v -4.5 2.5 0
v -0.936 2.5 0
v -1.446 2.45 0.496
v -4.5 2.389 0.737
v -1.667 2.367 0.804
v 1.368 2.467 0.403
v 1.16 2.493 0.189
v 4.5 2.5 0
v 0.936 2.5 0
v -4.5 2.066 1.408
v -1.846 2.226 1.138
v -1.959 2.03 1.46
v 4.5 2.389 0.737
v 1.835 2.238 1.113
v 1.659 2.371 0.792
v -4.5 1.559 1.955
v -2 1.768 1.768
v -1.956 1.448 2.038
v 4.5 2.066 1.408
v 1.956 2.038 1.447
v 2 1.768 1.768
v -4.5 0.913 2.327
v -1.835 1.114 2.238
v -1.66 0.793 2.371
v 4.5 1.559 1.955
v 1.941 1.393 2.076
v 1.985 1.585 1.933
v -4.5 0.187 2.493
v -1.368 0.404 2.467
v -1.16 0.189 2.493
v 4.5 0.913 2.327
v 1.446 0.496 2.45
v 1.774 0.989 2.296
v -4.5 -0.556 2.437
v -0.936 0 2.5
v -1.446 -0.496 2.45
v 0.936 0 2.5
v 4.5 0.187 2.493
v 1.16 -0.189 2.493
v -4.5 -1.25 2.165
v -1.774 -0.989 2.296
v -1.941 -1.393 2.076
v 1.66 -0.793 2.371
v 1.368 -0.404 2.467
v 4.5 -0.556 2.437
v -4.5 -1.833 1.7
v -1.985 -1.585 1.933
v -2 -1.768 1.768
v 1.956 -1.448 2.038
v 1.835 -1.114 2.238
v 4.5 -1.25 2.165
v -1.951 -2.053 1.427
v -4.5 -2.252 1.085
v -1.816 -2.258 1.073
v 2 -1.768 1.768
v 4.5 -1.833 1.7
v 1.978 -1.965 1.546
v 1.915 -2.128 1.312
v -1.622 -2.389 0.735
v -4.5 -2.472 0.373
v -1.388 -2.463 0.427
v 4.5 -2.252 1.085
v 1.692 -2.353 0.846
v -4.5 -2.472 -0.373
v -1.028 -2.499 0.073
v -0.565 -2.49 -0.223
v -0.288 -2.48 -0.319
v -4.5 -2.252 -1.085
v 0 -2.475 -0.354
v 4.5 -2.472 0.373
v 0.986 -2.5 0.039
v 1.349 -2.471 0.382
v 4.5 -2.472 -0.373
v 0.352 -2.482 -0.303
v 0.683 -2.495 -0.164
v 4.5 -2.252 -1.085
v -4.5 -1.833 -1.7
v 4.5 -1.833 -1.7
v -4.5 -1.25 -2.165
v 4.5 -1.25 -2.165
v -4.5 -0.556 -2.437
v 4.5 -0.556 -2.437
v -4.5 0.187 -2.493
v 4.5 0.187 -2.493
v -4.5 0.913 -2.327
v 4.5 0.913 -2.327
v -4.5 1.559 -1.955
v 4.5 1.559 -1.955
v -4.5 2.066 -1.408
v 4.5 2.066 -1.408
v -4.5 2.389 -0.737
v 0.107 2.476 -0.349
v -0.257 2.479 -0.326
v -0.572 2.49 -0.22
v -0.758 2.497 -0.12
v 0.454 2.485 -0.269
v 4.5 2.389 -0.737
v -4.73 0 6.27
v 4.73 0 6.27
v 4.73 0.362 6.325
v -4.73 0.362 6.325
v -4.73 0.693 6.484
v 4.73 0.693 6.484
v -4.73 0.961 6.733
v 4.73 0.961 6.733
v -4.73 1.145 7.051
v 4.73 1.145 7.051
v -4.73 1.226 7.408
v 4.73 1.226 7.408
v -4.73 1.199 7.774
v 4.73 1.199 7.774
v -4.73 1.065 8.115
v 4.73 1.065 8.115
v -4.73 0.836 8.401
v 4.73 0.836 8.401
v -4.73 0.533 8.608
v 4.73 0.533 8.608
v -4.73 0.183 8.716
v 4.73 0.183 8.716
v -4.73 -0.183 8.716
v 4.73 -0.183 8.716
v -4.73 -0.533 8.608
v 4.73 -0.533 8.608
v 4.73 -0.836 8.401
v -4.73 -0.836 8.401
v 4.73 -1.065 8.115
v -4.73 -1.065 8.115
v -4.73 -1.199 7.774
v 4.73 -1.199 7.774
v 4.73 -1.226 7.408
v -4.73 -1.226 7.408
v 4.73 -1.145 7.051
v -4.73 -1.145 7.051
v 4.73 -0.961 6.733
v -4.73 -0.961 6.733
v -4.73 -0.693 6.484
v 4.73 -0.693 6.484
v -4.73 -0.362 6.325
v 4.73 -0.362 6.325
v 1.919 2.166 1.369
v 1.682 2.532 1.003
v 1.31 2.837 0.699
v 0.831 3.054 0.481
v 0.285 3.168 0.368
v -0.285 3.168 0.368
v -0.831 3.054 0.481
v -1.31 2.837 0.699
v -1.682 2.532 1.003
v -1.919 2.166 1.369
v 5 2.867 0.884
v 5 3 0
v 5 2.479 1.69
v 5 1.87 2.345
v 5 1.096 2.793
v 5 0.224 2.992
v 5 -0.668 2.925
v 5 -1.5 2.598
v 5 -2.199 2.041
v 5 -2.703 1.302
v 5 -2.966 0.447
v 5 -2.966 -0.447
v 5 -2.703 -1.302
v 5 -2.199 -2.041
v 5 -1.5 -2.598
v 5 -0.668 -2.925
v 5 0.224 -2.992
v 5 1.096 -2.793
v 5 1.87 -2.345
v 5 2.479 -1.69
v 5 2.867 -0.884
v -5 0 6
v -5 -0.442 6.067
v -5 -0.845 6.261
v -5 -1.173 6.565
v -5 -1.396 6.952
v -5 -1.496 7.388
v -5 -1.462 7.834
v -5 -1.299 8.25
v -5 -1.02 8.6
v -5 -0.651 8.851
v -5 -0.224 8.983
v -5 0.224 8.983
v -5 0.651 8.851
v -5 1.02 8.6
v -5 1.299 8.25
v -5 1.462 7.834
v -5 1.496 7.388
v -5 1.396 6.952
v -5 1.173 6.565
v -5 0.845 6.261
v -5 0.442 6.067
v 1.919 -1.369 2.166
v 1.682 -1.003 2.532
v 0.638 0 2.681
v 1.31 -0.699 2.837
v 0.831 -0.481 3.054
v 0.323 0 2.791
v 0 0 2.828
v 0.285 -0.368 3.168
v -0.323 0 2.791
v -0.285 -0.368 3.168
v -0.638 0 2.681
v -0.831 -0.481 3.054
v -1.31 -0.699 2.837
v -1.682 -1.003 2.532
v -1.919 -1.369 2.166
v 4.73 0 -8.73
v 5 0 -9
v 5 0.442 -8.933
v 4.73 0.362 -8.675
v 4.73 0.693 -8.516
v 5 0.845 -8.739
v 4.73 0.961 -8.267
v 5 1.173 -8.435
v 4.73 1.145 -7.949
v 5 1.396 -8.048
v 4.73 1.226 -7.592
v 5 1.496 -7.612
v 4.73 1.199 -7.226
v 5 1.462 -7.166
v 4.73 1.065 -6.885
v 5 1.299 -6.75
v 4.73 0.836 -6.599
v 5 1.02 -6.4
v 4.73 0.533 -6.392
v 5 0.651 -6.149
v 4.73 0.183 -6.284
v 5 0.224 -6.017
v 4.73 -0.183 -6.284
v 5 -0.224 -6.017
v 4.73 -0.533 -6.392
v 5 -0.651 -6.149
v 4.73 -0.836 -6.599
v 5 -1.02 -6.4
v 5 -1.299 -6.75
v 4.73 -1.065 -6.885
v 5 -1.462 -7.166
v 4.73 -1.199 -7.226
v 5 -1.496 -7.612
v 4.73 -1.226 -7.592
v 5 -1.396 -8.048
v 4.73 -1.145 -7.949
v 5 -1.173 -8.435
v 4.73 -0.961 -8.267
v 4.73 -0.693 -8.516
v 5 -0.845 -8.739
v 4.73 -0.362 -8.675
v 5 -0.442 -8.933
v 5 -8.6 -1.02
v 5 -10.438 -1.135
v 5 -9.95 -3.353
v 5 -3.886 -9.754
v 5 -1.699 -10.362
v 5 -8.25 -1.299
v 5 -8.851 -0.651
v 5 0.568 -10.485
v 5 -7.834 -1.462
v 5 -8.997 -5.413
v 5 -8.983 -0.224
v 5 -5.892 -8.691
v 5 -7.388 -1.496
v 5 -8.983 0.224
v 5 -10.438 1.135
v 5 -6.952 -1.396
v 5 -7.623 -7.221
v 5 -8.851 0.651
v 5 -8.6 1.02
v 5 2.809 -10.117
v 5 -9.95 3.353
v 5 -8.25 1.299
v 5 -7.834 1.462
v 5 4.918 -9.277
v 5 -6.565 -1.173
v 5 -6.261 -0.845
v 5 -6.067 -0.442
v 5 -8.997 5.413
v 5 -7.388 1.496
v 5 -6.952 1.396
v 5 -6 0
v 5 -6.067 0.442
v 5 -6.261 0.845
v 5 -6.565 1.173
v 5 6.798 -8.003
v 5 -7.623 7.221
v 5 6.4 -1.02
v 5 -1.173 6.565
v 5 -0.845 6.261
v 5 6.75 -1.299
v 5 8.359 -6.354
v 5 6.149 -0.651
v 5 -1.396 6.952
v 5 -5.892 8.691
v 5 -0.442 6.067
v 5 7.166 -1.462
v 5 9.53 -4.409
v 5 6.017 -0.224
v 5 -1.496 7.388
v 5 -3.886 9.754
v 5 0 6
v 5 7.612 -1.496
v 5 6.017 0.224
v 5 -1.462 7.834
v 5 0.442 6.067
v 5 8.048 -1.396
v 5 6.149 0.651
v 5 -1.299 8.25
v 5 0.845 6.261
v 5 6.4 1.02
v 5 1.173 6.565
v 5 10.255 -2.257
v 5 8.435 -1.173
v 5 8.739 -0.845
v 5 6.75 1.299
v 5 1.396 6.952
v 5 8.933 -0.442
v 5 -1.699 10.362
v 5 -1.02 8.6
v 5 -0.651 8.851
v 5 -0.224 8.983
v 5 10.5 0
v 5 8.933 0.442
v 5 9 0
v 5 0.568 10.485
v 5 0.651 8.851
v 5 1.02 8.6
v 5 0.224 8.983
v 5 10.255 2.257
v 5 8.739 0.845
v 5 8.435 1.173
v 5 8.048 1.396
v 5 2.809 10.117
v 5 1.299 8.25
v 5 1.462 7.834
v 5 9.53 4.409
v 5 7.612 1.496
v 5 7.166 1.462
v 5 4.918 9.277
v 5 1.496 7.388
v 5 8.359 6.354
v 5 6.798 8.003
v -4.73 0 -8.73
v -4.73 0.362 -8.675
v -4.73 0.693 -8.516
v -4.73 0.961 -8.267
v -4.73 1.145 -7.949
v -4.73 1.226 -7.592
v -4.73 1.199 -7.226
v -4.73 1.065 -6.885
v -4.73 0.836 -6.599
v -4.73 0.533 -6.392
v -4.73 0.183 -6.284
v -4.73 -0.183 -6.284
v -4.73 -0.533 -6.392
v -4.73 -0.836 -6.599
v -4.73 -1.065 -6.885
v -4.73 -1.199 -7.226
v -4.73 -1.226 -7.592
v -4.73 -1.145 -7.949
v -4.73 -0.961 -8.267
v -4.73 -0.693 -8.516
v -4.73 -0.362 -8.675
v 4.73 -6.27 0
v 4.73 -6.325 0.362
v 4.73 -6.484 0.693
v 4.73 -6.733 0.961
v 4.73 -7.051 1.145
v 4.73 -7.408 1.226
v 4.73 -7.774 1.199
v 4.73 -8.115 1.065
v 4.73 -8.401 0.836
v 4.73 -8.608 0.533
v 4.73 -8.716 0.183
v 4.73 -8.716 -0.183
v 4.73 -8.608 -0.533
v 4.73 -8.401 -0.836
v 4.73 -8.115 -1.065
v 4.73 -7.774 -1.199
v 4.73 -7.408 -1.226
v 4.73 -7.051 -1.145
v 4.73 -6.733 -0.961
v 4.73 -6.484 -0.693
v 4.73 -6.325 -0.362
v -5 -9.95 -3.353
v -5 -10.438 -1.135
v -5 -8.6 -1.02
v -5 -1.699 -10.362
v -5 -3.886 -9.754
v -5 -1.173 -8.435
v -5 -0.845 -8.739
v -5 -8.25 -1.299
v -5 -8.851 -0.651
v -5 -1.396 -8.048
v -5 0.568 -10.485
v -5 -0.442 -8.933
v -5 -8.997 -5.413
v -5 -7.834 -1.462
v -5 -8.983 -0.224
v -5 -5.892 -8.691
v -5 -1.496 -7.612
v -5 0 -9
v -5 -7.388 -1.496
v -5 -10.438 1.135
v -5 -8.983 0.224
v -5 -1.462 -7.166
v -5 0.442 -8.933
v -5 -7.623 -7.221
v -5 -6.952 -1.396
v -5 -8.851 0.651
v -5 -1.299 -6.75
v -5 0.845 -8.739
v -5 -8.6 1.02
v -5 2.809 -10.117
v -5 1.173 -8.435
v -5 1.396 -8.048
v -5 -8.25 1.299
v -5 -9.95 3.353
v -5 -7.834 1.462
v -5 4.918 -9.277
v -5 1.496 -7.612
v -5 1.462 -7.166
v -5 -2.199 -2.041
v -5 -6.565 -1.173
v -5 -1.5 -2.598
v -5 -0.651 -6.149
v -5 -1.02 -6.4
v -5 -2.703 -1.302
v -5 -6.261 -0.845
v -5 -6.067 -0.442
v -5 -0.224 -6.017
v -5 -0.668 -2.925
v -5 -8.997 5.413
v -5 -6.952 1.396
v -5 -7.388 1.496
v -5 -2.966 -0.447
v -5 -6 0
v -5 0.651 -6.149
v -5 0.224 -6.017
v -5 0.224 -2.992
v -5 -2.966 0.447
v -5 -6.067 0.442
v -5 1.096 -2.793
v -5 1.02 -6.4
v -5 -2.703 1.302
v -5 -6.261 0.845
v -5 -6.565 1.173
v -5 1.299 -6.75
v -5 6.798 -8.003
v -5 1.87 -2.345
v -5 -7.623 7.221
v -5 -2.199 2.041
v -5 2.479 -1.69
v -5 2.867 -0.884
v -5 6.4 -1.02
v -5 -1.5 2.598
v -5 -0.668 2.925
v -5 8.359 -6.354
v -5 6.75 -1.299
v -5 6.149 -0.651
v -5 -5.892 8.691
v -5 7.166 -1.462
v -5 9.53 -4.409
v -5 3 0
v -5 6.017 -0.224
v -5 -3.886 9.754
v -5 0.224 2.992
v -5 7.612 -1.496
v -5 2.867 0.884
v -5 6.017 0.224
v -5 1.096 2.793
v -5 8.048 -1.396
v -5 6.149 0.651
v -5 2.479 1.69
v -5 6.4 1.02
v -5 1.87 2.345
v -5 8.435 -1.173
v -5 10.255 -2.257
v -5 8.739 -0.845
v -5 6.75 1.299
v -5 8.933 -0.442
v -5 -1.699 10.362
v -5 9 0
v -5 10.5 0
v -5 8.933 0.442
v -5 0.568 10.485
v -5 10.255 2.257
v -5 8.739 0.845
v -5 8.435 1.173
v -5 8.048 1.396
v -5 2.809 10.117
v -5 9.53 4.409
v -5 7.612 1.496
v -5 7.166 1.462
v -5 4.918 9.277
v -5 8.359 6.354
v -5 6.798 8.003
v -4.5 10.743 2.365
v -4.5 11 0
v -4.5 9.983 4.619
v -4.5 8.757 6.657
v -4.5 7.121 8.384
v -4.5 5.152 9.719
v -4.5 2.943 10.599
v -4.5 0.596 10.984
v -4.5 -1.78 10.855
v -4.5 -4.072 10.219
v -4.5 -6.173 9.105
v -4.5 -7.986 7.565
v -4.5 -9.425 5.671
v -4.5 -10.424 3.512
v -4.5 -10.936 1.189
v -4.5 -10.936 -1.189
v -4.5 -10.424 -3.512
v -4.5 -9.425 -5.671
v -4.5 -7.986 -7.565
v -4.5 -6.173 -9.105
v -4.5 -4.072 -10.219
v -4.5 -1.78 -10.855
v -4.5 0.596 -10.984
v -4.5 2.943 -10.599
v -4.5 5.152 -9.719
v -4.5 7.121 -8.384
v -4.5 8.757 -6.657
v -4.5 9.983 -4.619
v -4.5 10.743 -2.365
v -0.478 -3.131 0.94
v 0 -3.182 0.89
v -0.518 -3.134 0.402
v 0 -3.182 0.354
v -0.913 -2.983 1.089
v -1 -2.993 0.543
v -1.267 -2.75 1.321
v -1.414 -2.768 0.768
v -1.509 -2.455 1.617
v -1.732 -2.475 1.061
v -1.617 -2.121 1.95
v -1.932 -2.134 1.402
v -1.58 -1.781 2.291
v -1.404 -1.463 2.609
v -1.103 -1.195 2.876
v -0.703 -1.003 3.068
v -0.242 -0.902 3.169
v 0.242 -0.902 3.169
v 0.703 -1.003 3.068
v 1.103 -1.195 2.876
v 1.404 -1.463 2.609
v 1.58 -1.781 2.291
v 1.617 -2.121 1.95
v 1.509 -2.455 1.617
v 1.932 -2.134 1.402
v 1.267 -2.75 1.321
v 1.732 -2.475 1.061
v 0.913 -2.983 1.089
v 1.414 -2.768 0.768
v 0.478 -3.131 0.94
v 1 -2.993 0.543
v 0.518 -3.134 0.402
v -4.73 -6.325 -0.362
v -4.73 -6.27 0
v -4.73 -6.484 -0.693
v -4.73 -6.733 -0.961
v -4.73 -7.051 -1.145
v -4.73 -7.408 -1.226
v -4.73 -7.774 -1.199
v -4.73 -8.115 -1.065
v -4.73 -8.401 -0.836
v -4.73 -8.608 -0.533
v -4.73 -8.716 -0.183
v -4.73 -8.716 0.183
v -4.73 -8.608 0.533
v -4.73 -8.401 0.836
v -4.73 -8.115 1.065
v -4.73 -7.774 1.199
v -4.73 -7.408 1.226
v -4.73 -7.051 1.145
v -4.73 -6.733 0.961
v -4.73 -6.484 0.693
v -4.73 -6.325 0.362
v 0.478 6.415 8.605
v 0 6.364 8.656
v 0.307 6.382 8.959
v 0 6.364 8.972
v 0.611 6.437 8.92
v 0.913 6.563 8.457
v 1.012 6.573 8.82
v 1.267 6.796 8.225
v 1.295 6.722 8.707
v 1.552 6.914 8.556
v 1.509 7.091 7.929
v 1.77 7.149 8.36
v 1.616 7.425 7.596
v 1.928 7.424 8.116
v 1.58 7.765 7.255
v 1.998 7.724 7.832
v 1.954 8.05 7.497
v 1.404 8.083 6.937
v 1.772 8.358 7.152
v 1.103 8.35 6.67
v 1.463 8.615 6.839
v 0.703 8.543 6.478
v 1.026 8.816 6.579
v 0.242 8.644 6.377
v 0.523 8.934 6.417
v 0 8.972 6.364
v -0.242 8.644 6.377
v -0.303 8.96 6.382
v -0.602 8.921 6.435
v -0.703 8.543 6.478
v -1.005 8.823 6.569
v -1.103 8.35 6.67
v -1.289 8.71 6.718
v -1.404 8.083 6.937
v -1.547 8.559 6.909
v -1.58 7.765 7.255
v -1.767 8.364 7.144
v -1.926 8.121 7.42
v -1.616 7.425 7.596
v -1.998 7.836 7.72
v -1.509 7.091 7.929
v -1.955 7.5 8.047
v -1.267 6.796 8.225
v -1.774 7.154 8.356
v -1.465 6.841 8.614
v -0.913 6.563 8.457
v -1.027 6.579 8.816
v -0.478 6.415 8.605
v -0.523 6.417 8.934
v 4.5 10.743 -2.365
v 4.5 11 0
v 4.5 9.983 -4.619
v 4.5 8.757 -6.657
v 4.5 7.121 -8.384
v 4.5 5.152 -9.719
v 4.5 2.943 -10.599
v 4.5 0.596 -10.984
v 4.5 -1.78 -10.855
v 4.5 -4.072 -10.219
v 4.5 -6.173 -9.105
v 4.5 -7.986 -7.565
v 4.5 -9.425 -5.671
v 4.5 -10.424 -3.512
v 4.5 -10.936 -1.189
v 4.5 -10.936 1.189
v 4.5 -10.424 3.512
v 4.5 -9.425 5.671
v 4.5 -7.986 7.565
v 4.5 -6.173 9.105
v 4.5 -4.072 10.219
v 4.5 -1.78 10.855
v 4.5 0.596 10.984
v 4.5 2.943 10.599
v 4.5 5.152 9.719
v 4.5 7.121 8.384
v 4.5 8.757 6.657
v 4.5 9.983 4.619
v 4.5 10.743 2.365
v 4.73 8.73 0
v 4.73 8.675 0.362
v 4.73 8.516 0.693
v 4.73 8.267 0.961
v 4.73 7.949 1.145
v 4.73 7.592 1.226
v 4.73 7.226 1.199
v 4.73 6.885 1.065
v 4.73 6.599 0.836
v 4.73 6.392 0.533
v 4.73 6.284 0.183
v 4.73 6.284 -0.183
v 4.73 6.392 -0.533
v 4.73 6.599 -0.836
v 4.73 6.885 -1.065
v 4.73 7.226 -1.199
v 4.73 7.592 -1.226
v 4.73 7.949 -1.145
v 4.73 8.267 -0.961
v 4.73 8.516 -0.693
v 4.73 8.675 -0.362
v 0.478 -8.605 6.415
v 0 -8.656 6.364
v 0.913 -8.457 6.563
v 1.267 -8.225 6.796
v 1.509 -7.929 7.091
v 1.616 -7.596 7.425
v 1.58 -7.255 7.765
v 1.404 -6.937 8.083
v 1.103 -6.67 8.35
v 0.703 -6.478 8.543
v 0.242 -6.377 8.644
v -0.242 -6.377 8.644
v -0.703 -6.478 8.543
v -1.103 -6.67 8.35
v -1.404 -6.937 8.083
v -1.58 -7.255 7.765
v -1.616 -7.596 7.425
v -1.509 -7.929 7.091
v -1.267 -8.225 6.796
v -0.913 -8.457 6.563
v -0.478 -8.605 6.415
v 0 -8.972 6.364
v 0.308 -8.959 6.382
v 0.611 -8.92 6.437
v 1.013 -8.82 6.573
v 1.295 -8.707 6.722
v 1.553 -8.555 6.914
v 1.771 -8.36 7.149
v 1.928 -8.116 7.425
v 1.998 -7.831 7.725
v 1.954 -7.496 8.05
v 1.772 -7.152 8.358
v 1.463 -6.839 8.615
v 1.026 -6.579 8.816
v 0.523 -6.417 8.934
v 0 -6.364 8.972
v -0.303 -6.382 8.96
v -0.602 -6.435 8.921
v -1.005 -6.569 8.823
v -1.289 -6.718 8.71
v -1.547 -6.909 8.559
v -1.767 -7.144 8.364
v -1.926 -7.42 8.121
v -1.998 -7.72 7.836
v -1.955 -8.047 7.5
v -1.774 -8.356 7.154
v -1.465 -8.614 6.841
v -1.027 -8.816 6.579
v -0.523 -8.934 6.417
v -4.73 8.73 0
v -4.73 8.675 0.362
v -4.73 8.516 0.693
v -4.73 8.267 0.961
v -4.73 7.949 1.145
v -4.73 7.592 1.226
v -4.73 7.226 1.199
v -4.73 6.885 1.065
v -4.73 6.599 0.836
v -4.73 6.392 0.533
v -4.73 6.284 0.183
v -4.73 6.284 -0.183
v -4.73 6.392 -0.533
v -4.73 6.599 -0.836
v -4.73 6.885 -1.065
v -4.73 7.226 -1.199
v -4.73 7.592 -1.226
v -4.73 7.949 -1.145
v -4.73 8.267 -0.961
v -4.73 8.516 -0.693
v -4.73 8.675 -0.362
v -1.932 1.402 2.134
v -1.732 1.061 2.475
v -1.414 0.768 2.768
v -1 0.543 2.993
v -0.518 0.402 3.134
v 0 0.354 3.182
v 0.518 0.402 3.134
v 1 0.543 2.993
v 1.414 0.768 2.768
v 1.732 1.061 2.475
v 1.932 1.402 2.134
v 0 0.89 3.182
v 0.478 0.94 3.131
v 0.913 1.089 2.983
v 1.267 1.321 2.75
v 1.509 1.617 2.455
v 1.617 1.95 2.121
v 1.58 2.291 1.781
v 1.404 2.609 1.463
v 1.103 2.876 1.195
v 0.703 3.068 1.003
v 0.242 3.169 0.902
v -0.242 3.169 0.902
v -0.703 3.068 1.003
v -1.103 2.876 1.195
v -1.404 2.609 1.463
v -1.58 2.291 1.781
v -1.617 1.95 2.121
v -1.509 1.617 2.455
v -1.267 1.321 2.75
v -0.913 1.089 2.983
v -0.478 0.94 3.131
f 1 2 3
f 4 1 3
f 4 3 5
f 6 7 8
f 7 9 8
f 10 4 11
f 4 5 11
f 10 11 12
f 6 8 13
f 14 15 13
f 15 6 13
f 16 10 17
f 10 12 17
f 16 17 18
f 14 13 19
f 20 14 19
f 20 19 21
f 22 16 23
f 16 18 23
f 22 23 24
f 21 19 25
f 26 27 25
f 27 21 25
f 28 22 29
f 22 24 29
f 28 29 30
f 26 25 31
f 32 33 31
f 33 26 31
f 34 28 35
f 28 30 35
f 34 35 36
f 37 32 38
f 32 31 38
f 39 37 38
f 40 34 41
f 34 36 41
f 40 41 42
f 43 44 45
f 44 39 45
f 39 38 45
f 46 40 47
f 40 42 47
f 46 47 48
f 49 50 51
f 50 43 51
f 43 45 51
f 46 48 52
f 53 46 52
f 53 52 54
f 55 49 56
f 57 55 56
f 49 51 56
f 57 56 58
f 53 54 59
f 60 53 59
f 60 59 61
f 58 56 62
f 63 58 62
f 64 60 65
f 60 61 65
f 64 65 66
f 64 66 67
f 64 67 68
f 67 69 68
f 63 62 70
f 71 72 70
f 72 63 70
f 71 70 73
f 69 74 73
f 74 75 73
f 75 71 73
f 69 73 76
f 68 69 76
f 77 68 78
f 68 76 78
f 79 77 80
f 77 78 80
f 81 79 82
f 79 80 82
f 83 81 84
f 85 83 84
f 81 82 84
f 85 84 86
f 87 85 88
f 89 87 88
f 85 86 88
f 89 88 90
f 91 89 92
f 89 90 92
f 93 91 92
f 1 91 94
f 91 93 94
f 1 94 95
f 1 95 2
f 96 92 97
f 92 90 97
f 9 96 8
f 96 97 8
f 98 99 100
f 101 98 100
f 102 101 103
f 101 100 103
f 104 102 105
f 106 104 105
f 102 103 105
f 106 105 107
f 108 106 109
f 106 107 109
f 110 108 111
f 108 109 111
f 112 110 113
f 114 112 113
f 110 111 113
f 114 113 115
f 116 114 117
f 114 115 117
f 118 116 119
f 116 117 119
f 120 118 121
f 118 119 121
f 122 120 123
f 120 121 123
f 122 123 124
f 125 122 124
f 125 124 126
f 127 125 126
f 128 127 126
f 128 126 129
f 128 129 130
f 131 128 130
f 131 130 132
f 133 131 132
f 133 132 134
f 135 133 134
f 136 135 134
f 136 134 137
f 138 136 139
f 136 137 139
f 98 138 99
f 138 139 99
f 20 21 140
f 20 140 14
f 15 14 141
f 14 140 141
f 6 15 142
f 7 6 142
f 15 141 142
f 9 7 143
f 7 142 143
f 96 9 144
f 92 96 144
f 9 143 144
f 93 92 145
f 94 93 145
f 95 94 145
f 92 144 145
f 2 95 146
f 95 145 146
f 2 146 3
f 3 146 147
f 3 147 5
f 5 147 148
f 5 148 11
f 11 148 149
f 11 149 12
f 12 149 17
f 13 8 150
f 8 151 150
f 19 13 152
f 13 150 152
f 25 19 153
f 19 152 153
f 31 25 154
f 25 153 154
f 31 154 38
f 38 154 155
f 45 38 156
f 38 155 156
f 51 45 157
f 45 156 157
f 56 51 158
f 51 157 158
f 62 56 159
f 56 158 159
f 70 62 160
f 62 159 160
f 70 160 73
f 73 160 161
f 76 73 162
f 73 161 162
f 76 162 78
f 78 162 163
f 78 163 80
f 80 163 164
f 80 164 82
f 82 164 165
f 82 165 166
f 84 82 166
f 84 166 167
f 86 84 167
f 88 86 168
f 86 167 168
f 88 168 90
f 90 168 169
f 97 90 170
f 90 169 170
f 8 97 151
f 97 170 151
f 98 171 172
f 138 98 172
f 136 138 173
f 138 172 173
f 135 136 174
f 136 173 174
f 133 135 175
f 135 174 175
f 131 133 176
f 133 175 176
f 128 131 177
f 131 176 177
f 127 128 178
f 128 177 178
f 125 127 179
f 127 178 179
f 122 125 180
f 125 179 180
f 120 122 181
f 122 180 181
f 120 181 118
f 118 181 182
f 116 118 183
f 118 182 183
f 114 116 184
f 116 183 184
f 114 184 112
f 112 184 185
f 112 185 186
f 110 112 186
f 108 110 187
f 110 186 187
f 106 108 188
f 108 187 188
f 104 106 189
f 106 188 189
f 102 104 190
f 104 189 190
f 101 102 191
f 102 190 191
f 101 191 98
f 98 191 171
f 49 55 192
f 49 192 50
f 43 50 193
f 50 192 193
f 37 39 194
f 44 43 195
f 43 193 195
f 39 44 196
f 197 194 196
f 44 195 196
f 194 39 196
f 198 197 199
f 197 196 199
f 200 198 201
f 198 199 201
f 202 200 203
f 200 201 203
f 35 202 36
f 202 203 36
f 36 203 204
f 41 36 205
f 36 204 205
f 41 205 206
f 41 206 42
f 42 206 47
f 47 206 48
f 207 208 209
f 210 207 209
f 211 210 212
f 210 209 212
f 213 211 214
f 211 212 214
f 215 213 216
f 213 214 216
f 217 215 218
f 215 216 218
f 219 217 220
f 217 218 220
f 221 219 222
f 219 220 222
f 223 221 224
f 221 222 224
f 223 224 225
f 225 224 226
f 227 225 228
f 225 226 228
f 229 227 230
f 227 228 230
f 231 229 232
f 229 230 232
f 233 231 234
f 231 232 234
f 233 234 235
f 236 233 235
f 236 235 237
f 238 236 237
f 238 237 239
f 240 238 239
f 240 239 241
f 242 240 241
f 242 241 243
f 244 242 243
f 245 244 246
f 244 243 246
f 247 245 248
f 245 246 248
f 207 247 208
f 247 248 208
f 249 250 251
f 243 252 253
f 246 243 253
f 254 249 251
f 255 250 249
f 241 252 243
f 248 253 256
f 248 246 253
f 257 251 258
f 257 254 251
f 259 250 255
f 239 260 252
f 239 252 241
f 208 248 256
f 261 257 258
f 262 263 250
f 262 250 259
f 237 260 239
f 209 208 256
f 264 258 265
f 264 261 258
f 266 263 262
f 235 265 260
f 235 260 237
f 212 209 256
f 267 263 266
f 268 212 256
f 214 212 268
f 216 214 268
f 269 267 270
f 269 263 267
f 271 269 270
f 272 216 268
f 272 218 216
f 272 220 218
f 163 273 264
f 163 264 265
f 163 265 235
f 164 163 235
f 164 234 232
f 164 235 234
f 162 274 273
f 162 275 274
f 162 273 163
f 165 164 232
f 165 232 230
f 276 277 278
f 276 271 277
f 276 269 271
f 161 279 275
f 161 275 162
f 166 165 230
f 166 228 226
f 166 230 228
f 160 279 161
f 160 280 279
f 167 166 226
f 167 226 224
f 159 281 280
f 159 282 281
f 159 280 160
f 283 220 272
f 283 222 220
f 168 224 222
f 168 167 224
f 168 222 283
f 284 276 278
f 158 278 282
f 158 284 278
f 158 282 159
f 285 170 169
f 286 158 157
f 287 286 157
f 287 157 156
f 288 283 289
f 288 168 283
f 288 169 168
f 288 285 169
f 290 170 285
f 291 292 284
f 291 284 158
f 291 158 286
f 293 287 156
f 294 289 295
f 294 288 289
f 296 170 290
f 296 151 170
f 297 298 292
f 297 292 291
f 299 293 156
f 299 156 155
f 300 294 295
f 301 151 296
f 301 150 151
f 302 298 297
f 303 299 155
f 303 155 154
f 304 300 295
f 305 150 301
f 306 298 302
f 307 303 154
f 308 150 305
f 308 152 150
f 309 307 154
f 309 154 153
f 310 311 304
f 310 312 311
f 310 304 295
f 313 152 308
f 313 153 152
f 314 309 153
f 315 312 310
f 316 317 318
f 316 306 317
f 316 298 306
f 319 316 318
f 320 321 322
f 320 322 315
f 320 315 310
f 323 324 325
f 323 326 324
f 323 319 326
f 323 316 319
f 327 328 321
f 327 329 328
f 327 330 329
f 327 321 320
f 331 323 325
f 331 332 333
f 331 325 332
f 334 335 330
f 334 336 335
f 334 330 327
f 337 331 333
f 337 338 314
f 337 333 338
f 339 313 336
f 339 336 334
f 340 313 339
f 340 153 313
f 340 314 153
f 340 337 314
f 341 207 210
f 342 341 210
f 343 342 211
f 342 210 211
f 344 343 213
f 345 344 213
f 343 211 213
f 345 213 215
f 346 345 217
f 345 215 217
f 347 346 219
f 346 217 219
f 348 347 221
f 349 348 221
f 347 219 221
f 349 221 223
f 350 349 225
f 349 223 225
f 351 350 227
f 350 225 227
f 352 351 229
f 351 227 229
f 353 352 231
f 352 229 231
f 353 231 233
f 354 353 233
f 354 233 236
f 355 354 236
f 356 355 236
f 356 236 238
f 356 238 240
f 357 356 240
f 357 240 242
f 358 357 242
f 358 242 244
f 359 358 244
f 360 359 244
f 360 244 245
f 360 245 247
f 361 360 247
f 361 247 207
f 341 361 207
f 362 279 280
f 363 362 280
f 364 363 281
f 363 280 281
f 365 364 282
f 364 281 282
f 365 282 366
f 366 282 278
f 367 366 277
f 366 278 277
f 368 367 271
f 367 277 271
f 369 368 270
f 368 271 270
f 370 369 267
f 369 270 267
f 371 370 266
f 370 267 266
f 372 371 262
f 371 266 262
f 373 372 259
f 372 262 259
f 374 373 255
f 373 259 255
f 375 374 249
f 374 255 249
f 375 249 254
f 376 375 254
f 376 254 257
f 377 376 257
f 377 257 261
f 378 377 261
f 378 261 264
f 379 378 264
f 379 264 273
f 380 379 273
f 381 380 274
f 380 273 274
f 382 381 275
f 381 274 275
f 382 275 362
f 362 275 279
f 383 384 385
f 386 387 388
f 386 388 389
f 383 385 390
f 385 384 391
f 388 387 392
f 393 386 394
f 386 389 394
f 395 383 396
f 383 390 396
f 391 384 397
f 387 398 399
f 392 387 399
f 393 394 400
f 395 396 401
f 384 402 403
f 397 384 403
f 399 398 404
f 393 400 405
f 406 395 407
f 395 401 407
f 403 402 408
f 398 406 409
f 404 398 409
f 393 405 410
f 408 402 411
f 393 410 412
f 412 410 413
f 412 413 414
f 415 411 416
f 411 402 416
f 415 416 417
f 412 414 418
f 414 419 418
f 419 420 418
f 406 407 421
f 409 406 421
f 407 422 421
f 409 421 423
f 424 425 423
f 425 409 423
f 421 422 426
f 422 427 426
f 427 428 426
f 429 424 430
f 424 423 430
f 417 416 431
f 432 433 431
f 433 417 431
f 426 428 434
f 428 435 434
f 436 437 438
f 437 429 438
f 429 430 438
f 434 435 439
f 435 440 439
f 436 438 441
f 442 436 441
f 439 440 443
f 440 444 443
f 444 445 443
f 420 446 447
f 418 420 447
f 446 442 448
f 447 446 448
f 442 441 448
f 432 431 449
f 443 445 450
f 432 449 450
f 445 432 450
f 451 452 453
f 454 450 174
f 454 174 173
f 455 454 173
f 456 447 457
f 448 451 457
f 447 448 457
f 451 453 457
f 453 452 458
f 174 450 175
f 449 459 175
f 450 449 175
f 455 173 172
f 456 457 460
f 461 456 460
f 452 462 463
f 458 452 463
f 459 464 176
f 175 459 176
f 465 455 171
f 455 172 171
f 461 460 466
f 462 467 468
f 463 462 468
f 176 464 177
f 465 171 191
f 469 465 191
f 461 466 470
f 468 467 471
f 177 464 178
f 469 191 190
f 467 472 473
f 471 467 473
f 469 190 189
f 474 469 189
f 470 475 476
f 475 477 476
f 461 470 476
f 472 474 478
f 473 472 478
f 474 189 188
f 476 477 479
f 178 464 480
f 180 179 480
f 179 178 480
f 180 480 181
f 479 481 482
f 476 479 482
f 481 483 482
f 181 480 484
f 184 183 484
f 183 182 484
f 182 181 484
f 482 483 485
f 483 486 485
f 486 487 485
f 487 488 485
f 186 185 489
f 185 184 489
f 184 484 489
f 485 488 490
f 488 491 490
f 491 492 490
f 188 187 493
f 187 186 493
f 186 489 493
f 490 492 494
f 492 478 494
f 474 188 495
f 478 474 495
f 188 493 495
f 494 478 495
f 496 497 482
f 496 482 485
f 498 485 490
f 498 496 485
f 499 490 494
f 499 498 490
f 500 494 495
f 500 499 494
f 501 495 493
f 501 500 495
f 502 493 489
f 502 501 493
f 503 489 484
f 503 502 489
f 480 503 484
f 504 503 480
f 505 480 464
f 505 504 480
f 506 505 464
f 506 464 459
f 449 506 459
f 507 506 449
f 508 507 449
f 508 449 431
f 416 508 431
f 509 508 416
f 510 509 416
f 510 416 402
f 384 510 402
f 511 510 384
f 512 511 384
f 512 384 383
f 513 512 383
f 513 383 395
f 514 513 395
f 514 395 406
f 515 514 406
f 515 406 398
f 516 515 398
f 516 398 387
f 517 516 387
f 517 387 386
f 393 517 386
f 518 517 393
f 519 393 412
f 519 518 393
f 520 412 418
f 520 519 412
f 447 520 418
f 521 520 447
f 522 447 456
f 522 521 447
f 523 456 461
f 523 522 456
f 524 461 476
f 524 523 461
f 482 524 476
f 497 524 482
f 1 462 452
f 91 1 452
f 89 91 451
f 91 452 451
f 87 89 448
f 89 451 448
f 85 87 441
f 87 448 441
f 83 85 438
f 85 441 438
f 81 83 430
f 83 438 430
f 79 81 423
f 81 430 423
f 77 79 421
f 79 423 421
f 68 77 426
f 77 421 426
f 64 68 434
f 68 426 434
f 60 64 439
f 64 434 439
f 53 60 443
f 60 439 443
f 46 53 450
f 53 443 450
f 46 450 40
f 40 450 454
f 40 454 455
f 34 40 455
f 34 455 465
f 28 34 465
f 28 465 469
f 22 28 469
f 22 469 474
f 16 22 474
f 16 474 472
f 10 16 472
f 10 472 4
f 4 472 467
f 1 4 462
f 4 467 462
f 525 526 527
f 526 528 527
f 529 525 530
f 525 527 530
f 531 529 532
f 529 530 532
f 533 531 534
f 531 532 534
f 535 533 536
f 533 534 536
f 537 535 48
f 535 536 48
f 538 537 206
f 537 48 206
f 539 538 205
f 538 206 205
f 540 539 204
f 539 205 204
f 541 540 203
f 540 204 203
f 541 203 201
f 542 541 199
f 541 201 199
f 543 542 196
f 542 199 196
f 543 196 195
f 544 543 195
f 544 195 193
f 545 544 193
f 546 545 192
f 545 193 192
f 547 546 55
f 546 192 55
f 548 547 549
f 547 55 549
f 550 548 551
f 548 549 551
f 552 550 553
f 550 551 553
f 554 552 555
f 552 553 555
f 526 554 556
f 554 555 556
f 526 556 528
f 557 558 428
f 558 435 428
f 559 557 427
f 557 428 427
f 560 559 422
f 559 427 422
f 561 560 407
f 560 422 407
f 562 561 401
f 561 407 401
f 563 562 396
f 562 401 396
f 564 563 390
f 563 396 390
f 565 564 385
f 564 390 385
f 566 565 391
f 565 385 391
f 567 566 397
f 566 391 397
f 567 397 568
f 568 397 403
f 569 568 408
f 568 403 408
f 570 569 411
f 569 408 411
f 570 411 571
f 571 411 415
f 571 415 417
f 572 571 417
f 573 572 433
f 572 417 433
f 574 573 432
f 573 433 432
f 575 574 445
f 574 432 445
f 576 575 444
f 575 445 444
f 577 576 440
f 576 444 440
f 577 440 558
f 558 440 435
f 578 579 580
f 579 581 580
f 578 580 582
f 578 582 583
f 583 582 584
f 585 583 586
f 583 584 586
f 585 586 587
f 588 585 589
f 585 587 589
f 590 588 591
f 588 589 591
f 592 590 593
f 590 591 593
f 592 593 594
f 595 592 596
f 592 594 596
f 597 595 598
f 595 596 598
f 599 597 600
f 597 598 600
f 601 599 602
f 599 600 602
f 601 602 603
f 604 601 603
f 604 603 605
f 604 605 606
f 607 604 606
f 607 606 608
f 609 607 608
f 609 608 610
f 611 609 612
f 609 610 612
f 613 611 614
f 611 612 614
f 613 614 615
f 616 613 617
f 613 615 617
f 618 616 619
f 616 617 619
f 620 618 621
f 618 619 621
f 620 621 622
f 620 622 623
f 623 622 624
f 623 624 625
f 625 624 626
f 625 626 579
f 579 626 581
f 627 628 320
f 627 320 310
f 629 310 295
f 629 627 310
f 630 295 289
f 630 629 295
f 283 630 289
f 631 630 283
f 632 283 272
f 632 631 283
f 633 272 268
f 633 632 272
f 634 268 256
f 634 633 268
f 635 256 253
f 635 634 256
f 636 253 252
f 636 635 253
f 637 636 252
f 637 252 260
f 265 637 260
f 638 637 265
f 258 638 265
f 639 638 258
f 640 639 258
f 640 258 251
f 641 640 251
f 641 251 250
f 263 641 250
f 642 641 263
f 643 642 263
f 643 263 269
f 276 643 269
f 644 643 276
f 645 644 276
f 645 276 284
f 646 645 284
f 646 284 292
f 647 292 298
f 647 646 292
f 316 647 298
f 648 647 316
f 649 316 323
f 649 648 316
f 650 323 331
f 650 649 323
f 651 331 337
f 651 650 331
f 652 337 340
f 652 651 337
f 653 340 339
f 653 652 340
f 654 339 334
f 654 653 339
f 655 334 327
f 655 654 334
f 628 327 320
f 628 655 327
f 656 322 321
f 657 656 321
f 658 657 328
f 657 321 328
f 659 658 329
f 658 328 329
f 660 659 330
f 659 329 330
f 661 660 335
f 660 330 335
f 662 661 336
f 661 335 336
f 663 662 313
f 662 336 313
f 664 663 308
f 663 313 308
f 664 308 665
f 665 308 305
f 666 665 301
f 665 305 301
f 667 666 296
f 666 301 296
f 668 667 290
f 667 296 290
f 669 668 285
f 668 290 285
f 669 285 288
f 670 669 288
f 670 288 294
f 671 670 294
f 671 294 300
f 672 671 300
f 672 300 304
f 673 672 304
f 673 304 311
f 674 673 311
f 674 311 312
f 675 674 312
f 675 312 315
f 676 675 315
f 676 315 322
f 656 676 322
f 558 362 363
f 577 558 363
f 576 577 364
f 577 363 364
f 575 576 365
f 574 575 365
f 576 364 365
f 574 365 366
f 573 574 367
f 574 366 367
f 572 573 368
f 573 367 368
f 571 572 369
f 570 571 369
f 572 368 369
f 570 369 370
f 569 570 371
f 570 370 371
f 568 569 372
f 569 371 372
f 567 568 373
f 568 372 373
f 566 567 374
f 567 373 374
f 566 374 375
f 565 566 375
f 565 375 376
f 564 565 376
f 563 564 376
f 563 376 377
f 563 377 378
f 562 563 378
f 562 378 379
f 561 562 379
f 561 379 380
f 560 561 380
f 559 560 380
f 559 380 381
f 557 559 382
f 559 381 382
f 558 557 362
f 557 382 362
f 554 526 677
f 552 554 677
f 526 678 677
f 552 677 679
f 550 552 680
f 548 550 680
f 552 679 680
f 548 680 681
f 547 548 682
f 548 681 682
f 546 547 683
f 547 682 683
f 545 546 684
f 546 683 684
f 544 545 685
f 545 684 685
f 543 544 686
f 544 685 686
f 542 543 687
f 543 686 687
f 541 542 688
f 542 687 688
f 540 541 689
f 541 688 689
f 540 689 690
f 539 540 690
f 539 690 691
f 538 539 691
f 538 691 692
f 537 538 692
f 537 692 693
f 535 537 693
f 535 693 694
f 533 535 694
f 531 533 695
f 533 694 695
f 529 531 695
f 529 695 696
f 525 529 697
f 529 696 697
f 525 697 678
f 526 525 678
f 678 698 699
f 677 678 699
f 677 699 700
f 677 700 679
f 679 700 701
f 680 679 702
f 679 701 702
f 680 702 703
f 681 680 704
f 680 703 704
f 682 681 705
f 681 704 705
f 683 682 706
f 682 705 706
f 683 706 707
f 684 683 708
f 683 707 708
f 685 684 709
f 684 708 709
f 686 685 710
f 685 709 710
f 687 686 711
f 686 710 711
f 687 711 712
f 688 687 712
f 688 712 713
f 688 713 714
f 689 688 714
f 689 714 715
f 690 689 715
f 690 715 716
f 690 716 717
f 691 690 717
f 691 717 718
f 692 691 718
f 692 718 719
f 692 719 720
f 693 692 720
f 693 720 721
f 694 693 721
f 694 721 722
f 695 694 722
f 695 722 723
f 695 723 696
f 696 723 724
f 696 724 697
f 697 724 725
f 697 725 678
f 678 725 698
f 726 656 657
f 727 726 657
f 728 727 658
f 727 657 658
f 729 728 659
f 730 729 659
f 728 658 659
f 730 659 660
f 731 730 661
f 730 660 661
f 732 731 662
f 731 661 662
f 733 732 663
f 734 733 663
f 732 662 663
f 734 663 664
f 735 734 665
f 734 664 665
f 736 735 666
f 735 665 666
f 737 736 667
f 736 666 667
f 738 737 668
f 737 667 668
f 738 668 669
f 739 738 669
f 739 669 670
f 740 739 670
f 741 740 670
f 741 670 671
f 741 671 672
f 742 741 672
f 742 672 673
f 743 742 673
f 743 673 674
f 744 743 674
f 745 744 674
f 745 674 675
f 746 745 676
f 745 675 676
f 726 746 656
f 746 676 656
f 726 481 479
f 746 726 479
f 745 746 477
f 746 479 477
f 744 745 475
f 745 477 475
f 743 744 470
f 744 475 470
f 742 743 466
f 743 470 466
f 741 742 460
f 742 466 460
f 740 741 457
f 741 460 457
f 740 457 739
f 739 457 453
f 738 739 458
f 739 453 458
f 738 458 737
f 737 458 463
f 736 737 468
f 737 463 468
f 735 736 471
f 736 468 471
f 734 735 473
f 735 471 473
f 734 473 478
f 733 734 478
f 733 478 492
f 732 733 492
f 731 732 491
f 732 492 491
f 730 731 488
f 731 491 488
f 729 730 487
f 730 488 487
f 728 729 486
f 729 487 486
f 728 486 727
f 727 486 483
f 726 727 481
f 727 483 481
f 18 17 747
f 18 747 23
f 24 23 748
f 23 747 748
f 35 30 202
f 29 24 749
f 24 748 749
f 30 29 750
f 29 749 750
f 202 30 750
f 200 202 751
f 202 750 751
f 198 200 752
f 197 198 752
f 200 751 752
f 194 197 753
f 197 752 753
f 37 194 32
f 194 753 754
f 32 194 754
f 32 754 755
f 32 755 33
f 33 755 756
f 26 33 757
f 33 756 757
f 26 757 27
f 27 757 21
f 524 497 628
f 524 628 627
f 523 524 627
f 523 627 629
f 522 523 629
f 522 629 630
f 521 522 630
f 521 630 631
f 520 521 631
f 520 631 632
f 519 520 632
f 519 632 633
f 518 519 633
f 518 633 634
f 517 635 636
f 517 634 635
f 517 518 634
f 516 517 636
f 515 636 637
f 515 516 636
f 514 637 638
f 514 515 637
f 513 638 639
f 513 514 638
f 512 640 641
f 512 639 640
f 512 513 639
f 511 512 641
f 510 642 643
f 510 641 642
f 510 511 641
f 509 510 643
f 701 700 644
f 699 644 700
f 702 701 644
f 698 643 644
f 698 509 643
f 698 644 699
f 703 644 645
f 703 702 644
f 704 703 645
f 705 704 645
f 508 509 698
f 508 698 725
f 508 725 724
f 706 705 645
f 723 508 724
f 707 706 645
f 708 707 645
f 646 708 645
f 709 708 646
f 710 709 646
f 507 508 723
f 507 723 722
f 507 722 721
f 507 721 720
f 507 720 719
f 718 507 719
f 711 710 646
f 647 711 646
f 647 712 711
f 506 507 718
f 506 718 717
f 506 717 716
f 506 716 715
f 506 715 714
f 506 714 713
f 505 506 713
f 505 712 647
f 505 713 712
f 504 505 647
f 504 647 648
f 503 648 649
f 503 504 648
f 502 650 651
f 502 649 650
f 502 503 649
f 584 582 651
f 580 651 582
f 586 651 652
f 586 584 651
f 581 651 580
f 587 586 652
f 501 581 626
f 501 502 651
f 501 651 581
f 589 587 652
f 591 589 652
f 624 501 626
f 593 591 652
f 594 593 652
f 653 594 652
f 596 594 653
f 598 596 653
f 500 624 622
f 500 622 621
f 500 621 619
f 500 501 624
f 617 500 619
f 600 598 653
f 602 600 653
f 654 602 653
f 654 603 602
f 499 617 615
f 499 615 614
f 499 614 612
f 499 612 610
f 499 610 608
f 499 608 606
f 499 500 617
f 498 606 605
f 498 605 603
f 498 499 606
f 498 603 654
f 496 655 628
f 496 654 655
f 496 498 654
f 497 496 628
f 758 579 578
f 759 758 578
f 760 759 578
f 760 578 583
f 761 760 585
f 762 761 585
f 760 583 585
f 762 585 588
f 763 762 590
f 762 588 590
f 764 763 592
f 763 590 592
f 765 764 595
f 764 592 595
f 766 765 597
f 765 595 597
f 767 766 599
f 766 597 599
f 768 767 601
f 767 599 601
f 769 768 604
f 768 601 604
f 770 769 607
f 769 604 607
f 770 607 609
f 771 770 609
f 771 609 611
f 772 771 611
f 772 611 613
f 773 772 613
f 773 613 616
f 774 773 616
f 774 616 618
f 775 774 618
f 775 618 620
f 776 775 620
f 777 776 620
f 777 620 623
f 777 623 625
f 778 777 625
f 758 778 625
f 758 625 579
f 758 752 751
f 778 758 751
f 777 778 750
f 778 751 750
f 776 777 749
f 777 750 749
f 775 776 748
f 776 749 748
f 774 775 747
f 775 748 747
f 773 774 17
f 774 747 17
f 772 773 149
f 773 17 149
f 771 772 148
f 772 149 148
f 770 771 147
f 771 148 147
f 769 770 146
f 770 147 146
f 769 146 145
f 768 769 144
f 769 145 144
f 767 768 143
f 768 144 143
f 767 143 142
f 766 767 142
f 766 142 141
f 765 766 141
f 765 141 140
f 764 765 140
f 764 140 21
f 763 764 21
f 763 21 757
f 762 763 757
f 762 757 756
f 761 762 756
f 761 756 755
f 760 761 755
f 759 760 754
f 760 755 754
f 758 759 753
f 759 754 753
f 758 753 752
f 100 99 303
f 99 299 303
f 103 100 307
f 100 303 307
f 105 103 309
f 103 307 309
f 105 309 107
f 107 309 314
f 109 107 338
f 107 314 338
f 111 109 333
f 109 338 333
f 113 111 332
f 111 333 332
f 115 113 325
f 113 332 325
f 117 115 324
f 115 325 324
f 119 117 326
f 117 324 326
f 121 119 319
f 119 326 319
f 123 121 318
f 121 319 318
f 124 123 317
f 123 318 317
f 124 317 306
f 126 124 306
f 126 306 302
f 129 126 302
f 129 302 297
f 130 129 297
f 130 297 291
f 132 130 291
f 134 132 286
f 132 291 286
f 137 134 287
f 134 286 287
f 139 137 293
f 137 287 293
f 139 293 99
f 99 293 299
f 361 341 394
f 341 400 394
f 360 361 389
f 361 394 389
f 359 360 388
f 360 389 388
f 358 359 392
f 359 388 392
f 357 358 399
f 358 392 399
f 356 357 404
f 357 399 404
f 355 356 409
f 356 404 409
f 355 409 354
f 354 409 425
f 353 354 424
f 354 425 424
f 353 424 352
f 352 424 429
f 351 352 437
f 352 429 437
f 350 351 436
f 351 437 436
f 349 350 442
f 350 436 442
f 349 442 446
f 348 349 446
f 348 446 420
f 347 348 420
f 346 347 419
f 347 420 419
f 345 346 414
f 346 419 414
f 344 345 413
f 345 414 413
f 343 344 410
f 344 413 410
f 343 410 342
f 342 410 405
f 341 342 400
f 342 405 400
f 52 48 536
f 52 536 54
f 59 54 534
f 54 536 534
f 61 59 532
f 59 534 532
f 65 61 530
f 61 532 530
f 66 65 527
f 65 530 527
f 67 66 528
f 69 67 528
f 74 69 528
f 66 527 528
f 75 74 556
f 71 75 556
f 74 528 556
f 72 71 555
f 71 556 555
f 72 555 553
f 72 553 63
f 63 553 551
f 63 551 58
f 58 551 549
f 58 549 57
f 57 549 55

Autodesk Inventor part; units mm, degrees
sketch "Sketch_1" plane through (0, 0, 0) normal (0, 0, 1) x (1, 0, 0)
  line L0 (0, 0) -> (-5, 0)
  line L1 (-5, 3) -> (-4.5, 2.5)
  line L2 (-4.5, 2.5) -> (4.5, 2.5)
  line L3 (4.5, 2.5) -> (5, 3)
  line L4 (5, 3) -> (5, 10.5)
  line L5 (5, 10.5) -> (4.5, 11)
  line L6 (4.5, 11) -> (-4.5, 11)
  line L7 (-4.5, 11) -> (-5, 10.5)
  line L8 (-5, 10.5) -> (-5, 3)
revolve "Revolution1" add sketch "Sketch_1" angle 360 about axis through (0, 0, 0) along (1, 0, 0)
sketch "Sketch_2" plane through (0, 0, 0) normal (1, 0, 0) x (0, 1, 0)
  line L0 (8.556, 8.556) -> (0.9899, 0.9899)
  line L1 (0.9899, 0.9899) -> (-0.4243, 2.4042)
  line L2 (-0.4243, 2.4042) -> (0.3536, 3.182)
  line L3 (0.3536, 3.182) -> (0.8895, 3.182)
  line L4 (0.8895, 3.182) -> (6.364, 8.6564)
  line L5 (6.364, 8.6564) -> (6.364, 9.1924)
  line L6 (6.364, 9.1924) -> (7.1418, 9.9702)
  line L7 (7.1418, 9.9702) -> (8.556, 8.556)
  line L8 (8.556, 8.556) -> (0.9899, 0.9899)
revolve "Revolution2" cut sketch "Sketch_2" angle 360 about axis through (0, 8.556, 8.556) along (0, 0.7071, 0.7071)
thread "Thread1" size "M4x0.7" class "6H" standard "ISO Metric profile" full length
sketch "Sketch_3" plane through (0, 0, 0) normal (1, 0, 0) x (0, 1, 0)
  line L0 (-8.556, 8.556) -> (-0.9899, 0.9899)
  line L1 (-0.9899, 0.9899) -> (-2.4042, -0.4243)
  line L2 (-2.4042, -0.4243) -> (-3.182, 0.3536)
  line L3 (-3.182, 0.3536) -> (-3.182, 0.8895)
  line L4 (-3.182, 0.8895) -> (-8.6564, 6.364)
  line L5 (-8.6564, 6.364) -> (-9.1924, 6.364)
  line L6 (-9.1924, 6.364) -> (-9.9702, 7.1418)
  line L7 (-9.9702, 7.1418) -> (-8.556, 8.556)
  line L8 (-8.556, 8.556) -> (-0.9899, 0.9899)
revolve "Revolution3" cut sketch "Sketch_3" angle 360 about axis through (0, -8.556, 8.556) along (0, -0.7071, 0.7071)
thread "Thread2" size "M4x0.7" class "6H" standard "ISO Metric profile" full length
sketch "Sketch_10" plane through (0, 0, 0) normal (0, 1, 0) x (-1, 0, 0)
  line L0 (-5, -7.5) -> (5, -7.5)
  line L1 (5, -7.5) -> (5, -9)
  line L2 (5, -9) -> (4.7295, -8.7295)
  line L3 (4.7295, -8.7295) -> (-4.7295, -8.7295)
  line L4 (-4.7295, -8.7295) -> (-5, -9)
  line L5 (-5, -9) -> (-5, -7.5)
  line L6 (-5, -7.5) -> (5, -7.5)
revolve "Revolution4" cut sketch "Sketch_10" angle 360 about axis through (5, 0, -7.5) along (1, 0, 0)
thread "Thread3" size "M3x0.5" class "6H" standard "ISO Metric profile" full length
sketch "Sketch_11" plane through (0, 0, 0) normal (0, 1, 0) x (-1, 0, 0)
  line L0 (-5, 7.5) -> (5, 7.5)
  line L1 (5, 7.5) -> (5, 6)
  line L2 (5, 6) -> (4.7295, 6.2705)
  line L3 (4.7295, 6.2705) -> (-4.7295, 6.2705)
  line L4 (-4.7295, 6.2705) -> (-5, 6)
  line L5 (-5, 6) -> (-5, 7.5)
  line L6 (-5, 7.5) -> (5, 7.5)
revolve "Revolution5" cut sketch "Sketch_11" angle 360 about axis through (5, 0, 7.5) along (1, 0, 0)
thread "Thread4" size "M3x0.5" class "6H" standard "ISO Metric profile" full length
sketch "Sketch_12" plane through (0, 0, 0) normal (0, 0, 1) x (1, 0, 0)
  line L0 (5, 7.5) -> (-5, 7.5)
  line L1 (-5, 7.5) -> (-5, 9)
  line L2 (-5, 9) -> (-4.7295, 8.7295)
  line L3 (-4.7295, 8.7295) -> (4.7295, 8.7295)
  line L4 (4.7295, 8.7295) -> (5, 9)
  line L5 (5, 9) -> (5, 7.5)
  line L6 (5, 7.5) -> (-5, 7.5)
revolve "Revolution6" cut sketch "Sketch_12" angle 360 about axis through (5, 7.5, 0) along (1, 0, 0)
thread "Thread5" size "M3x0.5" class "6H" standard "ISO Metric profile" full length
sketch "Sketch_13" plane through (0, 0, 0) normal (0, 0, 1) x (1, 0, 0)
  line L0 (5, -7.5) -> (-5, -7.5)
  line L1 (-5, -7.5) -> (-5, -6)
  line L2 (-5, -6) -> (-4.7295, -6.2705)
  line L3 (-4.7295, -6.2705) -> (4.7295, -6.2705)
  line L4 (4.7295, -6.2705) -> (5, -6)
  line L5 (5, -6) -> (5, -7.5)
  line L6 (5, -7.5) -> (-5, -7.5)
revolve "Revolution7" cut sketch "Sketch_13" angle 360 about axis through (5, -7.5, 0) along (1, 0, 0)
thread "Thread6" size "M3x0.5" class "6H" standard "ISO Metric profile" full length
ref_plane "body_set_h_XY" through (0, -7.7782, 7.7782) normal (0, 0.7071, -0.7071) x (1, 0, 0)
ref_plane "body_set_h_YZ" through (0, -7.7782, 7.7782) normal (1, 0, 0) x (0, -0.7071, -0.7071)
ref_plane "body_set_h_ZX" through (0, -7.7782, 7.7782) normal (0, -0.7071, -0.7071) x (0, 0.7071, -0.7071)
ref_plane "body_set_v_XY" through (0, 7.7782, 7.7782) normal (0, 0.7071, 0.7071) x (1, 0, 0)
ref_plane "body_set_v_YZ" through (0, 7.7782, 7.7782) normal (1, 0, 0) x (0, 0.7071, -0.7071)
ref_plane "body_set_v_ZX" through (0, 7.7782, 7.7782) normal (0, 0.7071, -0.7071) x (0, 0.7071, 0.7071)
properties part number "SCMW5b"
